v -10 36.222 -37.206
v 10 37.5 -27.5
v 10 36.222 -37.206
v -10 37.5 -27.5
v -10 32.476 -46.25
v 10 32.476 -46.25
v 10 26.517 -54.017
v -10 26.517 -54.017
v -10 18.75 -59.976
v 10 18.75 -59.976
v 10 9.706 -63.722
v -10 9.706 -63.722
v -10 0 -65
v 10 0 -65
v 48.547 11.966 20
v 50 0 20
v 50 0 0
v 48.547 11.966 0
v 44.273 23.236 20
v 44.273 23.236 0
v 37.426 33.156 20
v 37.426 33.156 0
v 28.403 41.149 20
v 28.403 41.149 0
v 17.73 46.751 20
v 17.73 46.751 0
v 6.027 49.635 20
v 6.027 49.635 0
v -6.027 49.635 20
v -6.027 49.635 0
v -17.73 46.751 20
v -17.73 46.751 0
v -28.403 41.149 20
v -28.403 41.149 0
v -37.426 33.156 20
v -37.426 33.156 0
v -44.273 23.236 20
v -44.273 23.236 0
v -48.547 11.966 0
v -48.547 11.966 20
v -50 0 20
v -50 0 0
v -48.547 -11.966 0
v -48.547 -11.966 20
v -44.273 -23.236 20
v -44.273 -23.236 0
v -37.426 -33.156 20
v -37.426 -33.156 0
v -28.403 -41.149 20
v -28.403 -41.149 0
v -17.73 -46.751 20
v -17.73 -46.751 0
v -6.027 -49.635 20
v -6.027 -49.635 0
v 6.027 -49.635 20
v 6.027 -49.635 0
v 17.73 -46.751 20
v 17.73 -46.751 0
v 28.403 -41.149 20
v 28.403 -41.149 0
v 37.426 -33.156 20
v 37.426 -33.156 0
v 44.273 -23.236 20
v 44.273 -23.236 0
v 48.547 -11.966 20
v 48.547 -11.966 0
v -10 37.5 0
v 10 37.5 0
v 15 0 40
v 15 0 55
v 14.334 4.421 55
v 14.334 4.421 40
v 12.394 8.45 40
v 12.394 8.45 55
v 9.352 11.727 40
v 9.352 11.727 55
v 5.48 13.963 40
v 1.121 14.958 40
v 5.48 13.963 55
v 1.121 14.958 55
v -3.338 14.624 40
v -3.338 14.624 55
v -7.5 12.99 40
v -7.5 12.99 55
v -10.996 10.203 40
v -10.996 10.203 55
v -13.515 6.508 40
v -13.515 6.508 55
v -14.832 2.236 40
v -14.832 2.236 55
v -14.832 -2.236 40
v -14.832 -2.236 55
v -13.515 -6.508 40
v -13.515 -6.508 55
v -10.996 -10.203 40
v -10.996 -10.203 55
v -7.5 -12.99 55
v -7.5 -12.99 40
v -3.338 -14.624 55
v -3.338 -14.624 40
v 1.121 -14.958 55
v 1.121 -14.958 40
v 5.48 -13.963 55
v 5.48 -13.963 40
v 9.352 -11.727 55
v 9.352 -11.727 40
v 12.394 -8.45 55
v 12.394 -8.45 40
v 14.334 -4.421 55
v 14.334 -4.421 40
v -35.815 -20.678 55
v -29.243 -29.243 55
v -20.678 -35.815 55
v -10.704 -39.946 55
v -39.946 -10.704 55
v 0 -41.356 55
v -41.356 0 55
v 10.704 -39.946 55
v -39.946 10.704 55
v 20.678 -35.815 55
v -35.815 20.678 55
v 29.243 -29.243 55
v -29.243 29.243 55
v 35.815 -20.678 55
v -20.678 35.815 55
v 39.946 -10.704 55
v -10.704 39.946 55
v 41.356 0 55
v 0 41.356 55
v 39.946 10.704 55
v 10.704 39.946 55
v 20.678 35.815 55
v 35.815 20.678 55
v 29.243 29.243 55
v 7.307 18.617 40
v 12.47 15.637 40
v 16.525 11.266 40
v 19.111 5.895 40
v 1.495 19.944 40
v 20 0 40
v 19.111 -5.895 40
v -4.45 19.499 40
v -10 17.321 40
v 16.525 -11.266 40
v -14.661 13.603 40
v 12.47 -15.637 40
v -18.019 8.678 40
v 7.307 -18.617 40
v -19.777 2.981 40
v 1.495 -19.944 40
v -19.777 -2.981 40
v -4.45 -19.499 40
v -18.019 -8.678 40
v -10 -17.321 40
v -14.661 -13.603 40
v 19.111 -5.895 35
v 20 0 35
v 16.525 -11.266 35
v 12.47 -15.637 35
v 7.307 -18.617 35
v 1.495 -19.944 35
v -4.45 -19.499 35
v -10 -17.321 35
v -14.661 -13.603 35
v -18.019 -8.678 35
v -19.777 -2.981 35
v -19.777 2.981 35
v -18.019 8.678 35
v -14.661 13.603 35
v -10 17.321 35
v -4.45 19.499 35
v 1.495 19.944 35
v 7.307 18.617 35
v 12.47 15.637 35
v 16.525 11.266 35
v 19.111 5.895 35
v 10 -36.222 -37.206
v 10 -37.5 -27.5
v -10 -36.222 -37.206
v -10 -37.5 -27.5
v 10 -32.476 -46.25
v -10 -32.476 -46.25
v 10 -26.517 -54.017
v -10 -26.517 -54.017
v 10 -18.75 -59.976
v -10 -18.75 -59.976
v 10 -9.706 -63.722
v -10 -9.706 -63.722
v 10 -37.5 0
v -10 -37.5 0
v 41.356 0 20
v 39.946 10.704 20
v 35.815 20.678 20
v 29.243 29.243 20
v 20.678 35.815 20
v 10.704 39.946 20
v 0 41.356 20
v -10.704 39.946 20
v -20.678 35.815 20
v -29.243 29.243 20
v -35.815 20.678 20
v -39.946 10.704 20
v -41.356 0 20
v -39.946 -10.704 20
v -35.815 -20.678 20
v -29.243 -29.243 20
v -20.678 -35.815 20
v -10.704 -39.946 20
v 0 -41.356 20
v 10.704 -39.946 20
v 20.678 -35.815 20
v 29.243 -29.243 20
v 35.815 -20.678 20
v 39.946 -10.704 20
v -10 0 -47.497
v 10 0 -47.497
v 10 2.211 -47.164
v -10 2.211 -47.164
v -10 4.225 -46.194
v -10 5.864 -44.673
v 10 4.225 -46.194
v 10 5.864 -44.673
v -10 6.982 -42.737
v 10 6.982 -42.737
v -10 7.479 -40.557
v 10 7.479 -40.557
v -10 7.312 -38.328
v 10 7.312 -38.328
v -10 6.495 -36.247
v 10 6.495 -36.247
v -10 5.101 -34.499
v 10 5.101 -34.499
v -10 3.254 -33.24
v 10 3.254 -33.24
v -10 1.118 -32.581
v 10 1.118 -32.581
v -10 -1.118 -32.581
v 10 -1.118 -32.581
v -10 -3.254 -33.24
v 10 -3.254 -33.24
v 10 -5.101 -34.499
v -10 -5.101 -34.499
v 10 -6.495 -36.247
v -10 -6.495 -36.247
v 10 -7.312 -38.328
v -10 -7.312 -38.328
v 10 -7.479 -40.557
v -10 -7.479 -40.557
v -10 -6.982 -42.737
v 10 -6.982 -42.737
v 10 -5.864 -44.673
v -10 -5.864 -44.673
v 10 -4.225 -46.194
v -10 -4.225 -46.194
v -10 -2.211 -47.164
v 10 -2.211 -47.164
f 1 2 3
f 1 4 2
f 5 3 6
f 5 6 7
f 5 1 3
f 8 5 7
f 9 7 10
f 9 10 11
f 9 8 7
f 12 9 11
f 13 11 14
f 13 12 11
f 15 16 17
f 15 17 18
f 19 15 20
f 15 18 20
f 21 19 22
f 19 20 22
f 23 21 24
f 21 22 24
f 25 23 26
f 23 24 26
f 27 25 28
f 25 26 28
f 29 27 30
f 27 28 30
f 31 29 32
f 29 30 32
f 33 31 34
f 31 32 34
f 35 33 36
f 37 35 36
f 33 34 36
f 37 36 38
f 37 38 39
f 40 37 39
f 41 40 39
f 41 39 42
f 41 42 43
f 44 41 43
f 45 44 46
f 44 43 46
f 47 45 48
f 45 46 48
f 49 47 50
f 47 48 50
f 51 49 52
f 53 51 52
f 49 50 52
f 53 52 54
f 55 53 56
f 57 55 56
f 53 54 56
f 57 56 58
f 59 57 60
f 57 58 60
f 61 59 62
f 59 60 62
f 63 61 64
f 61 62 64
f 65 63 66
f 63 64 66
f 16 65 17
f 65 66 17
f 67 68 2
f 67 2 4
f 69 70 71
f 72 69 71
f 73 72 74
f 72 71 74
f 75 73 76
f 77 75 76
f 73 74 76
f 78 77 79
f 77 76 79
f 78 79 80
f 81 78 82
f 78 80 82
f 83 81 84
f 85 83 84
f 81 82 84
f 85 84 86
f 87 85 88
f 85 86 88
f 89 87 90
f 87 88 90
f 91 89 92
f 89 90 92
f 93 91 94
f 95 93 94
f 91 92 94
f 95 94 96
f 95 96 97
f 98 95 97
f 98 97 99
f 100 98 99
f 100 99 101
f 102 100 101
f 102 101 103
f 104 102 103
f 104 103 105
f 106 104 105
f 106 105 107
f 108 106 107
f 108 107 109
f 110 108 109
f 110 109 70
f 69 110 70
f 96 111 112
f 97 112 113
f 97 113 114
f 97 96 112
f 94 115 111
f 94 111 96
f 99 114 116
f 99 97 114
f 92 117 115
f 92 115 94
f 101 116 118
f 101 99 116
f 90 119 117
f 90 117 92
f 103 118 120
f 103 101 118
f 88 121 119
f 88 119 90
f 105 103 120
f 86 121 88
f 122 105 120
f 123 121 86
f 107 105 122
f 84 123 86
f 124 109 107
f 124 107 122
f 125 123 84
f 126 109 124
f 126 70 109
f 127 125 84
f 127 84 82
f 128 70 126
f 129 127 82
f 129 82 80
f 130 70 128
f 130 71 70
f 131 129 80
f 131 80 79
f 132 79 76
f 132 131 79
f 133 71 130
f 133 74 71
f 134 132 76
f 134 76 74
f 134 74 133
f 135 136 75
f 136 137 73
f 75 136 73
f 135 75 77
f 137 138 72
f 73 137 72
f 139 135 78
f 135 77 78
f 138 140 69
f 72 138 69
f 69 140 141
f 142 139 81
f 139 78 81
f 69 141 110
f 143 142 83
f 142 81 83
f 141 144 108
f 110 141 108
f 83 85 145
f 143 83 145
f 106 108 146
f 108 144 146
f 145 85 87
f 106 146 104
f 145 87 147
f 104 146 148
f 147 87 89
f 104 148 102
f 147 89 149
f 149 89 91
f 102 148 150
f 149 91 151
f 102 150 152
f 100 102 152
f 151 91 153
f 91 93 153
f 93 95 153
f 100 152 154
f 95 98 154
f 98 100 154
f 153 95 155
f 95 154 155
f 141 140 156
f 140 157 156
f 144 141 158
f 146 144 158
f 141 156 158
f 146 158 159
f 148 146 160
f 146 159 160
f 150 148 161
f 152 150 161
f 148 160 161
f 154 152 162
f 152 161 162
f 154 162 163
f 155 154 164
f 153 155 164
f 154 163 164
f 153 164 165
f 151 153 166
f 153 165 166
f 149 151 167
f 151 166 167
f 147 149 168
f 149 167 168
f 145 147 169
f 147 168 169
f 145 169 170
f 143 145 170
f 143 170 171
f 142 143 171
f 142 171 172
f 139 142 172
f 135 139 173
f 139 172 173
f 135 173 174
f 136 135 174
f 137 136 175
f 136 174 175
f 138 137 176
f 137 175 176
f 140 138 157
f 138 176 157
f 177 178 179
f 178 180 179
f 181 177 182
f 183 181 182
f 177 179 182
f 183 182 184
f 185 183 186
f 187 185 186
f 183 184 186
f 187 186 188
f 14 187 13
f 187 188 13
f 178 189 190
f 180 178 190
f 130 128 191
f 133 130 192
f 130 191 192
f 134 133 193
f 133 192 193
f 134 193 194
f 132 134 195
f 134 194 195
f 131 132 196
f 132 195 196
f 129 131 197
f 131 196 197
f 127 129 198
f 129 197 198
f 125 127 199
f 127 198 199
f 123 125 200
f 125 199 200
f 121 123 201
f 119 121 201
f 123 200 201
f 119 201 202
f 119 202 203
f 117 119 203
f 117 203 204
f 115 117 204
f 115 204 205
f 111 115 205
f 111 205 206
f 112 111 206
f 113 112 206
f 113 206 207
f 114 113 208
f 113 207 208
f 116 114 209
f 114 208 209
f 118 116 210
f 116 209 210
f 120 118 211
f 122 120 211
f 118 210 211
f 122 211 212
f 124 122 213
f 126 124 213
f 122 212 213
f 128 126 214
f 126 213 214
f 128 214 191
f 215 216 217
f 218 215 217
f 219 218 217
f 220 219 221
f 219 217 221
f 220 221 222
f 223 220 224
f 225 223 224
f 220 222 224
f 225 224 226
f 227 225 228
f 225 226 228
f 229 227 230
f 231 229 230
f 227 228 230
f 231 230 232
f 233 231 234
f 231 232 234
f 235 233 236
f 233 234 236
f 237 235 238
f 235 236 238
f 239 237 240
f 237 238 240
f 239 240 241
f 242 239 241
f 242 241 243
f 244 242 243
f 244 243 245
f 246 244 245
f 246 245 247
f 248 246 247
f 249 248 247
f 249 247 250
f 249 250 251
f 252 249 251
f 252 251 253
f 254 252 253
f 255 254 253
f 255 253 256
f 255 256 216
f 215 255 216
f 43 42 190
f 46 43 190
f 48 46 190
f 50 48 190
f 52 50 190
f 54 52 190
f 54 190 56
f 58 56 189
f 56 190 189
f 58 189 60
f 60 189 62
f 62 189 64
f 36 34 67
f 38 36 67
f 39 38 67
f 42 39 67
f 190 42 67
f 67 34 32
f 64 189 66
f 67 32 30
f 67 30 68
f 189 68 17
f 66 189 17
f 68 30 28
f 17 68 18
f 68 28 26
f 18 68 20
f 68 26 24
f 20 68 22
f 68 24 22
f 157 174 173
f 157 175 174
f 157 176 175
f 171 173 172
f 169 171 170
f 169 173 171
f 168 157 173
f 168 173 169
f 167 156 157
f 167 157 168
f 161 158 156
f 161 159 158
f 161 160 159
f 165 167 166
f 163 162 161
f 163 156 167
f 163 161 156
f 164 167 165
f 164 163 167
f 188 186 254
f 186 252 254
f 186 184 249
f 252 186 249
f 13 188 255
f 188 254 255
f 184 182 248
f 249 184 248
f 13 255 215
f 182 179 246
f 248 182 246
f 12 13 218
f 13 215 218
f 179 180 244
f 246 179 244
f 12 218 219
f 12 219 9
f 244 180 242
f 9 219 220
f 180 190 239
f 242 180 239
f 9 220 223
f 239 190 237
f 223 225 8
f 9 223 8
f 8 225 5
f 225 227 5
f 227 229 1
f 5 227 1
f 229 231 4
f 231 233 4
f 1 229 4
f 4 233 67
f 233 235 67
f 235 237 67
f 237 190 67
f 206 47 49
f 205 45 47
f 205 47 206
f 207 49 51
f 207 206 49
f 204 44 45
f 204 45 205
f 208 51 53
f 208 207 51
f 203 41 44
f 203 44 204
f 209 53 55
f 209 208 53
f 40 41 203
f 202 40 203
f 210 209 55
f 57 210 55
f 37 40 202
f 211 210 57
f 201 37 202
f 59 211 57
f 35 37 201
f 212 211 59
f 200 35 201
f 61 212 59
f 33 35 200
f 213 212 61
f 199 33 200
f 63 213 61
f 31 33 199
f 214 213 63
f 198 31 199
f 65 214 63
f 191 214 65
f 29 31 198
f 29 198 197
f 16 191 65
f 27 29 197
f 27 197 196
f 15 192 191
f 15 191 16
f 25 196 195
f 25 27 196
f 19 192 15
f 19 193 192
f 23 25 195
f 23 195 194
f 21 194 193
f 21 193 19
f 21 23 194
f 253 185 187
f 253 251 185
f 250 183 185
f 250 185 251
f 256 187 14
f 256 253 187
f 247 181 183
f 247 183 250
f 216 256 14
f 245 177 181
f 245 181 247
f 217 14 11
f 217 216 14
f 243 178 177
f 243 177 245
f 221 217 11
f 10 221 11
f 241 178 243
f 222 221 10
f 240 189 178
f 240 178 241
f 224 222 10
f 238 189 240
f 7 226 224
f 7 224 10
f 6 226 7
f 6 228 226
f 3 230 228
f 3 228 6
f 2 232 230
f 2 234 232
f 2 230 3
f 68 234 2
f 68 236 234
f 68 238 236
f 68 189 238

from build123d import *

# Parameters (mm, degrees)
SKETCH1_R           = 50
BOSS_EXTRUDE1_DEPTH = 20
SKETCH2_W           = 20
SKETCH2_H           = 75
BOSS_EXTRUDE2_DEPTH = 65
SKETCH3_R           = 7.5
CUT_EXTRUDE1_DEPTH  = 65
FILLET1_R           = 37.5
SKETCH4_R           = 41.355609665
BOSS_EXTRUDE3_DEPTH = 35
SKETCH8_R           = 15
CUT_EXTRUDE2_DEPTH  = 20
SKETCH10_W          = 5
SKETCH10_H          = 8.446283525


with BuildPart() as part:
    # Sketch1 → Boss-Extrude1 (new body)
    with BuildSketch(Plane.XY):
        Circle(SKETCH1_R)
    extrude(amount=BOSS_EXTRUDE1_DEPTH)

    # Sketch2 → Boss-Extrude2 (add)
    with BuildSketch(Plane(origin=(0, 0, 0), x_dir=(-1, 0, 0), z_dir=(0, 0, -1))):
        Rectangle(SKETCH2_W, SKETCH2_H)
    extrude(amount=BOSS_EXTRUDE2_DEPTH)

    # Sketch3 → Cut-Extrude1 (cut)
    with BuildSketch(Plane(origin=(10, 0, 0), x_dir=(0, 0, -1), z_dir=(1, 0, 0))):
        with Locations((39.996807152, 0)):
            Circle(SKETCH3_R)
    extrude(amount=-CUT_EXTRUDE1_DEPTH, mode=Mode.SUBTRACT)

    # Fillet1
    fillet1_edges = [part.edges().sort_by_distance(p)[0] for p in [
        (0, -37.5, -65),
        (0, 37.5, -65),
    ]]
    fillet(fillet1_edges, radius=FILLET1_R - 0.0001)  # a hair under: the kernel refuses the full size

    # Sketch4 → Boss-Extrude3 (add)
    with BuildSketch(Plane.XY.offset(20)):
        Circle(SKETCH4_R)
    extrude(amount=BOSS_EXTRUDE3_DEPTH)

    # Sketch8 → Cut-Extrude2 (cut)
    with BuildSketch(Plane.XY.offset(55)):
        Circle(SKETCH8_R)
    extrude(amount=-CUT_EXTRUDE2_DEPTH, mode=Mode.SUBTRACT)

    # Sketch10 → Cut-Revolve1 (revolve, cut)
    with BuildSketch(Plane(origin=(0, 0, 0), x_dir=(0, 0, -1), z_dir=(1, 0, 0)), mode=Mode.PRIVATE) as cut_revolve1_sk:
        with Locations((-37.5, 15.776858238)):
            Rectangle(SKETCH10_W, SKETCH10_H)
    revolve(cut_revolve1_sk.sketch.rotate(Axis((0, 0, 55), (0, 0, -1)), 90), axis=Axis((0, 0, 55), (0, 0, -1)), mode=Mode.SUBTRACT)


solid = part.part
